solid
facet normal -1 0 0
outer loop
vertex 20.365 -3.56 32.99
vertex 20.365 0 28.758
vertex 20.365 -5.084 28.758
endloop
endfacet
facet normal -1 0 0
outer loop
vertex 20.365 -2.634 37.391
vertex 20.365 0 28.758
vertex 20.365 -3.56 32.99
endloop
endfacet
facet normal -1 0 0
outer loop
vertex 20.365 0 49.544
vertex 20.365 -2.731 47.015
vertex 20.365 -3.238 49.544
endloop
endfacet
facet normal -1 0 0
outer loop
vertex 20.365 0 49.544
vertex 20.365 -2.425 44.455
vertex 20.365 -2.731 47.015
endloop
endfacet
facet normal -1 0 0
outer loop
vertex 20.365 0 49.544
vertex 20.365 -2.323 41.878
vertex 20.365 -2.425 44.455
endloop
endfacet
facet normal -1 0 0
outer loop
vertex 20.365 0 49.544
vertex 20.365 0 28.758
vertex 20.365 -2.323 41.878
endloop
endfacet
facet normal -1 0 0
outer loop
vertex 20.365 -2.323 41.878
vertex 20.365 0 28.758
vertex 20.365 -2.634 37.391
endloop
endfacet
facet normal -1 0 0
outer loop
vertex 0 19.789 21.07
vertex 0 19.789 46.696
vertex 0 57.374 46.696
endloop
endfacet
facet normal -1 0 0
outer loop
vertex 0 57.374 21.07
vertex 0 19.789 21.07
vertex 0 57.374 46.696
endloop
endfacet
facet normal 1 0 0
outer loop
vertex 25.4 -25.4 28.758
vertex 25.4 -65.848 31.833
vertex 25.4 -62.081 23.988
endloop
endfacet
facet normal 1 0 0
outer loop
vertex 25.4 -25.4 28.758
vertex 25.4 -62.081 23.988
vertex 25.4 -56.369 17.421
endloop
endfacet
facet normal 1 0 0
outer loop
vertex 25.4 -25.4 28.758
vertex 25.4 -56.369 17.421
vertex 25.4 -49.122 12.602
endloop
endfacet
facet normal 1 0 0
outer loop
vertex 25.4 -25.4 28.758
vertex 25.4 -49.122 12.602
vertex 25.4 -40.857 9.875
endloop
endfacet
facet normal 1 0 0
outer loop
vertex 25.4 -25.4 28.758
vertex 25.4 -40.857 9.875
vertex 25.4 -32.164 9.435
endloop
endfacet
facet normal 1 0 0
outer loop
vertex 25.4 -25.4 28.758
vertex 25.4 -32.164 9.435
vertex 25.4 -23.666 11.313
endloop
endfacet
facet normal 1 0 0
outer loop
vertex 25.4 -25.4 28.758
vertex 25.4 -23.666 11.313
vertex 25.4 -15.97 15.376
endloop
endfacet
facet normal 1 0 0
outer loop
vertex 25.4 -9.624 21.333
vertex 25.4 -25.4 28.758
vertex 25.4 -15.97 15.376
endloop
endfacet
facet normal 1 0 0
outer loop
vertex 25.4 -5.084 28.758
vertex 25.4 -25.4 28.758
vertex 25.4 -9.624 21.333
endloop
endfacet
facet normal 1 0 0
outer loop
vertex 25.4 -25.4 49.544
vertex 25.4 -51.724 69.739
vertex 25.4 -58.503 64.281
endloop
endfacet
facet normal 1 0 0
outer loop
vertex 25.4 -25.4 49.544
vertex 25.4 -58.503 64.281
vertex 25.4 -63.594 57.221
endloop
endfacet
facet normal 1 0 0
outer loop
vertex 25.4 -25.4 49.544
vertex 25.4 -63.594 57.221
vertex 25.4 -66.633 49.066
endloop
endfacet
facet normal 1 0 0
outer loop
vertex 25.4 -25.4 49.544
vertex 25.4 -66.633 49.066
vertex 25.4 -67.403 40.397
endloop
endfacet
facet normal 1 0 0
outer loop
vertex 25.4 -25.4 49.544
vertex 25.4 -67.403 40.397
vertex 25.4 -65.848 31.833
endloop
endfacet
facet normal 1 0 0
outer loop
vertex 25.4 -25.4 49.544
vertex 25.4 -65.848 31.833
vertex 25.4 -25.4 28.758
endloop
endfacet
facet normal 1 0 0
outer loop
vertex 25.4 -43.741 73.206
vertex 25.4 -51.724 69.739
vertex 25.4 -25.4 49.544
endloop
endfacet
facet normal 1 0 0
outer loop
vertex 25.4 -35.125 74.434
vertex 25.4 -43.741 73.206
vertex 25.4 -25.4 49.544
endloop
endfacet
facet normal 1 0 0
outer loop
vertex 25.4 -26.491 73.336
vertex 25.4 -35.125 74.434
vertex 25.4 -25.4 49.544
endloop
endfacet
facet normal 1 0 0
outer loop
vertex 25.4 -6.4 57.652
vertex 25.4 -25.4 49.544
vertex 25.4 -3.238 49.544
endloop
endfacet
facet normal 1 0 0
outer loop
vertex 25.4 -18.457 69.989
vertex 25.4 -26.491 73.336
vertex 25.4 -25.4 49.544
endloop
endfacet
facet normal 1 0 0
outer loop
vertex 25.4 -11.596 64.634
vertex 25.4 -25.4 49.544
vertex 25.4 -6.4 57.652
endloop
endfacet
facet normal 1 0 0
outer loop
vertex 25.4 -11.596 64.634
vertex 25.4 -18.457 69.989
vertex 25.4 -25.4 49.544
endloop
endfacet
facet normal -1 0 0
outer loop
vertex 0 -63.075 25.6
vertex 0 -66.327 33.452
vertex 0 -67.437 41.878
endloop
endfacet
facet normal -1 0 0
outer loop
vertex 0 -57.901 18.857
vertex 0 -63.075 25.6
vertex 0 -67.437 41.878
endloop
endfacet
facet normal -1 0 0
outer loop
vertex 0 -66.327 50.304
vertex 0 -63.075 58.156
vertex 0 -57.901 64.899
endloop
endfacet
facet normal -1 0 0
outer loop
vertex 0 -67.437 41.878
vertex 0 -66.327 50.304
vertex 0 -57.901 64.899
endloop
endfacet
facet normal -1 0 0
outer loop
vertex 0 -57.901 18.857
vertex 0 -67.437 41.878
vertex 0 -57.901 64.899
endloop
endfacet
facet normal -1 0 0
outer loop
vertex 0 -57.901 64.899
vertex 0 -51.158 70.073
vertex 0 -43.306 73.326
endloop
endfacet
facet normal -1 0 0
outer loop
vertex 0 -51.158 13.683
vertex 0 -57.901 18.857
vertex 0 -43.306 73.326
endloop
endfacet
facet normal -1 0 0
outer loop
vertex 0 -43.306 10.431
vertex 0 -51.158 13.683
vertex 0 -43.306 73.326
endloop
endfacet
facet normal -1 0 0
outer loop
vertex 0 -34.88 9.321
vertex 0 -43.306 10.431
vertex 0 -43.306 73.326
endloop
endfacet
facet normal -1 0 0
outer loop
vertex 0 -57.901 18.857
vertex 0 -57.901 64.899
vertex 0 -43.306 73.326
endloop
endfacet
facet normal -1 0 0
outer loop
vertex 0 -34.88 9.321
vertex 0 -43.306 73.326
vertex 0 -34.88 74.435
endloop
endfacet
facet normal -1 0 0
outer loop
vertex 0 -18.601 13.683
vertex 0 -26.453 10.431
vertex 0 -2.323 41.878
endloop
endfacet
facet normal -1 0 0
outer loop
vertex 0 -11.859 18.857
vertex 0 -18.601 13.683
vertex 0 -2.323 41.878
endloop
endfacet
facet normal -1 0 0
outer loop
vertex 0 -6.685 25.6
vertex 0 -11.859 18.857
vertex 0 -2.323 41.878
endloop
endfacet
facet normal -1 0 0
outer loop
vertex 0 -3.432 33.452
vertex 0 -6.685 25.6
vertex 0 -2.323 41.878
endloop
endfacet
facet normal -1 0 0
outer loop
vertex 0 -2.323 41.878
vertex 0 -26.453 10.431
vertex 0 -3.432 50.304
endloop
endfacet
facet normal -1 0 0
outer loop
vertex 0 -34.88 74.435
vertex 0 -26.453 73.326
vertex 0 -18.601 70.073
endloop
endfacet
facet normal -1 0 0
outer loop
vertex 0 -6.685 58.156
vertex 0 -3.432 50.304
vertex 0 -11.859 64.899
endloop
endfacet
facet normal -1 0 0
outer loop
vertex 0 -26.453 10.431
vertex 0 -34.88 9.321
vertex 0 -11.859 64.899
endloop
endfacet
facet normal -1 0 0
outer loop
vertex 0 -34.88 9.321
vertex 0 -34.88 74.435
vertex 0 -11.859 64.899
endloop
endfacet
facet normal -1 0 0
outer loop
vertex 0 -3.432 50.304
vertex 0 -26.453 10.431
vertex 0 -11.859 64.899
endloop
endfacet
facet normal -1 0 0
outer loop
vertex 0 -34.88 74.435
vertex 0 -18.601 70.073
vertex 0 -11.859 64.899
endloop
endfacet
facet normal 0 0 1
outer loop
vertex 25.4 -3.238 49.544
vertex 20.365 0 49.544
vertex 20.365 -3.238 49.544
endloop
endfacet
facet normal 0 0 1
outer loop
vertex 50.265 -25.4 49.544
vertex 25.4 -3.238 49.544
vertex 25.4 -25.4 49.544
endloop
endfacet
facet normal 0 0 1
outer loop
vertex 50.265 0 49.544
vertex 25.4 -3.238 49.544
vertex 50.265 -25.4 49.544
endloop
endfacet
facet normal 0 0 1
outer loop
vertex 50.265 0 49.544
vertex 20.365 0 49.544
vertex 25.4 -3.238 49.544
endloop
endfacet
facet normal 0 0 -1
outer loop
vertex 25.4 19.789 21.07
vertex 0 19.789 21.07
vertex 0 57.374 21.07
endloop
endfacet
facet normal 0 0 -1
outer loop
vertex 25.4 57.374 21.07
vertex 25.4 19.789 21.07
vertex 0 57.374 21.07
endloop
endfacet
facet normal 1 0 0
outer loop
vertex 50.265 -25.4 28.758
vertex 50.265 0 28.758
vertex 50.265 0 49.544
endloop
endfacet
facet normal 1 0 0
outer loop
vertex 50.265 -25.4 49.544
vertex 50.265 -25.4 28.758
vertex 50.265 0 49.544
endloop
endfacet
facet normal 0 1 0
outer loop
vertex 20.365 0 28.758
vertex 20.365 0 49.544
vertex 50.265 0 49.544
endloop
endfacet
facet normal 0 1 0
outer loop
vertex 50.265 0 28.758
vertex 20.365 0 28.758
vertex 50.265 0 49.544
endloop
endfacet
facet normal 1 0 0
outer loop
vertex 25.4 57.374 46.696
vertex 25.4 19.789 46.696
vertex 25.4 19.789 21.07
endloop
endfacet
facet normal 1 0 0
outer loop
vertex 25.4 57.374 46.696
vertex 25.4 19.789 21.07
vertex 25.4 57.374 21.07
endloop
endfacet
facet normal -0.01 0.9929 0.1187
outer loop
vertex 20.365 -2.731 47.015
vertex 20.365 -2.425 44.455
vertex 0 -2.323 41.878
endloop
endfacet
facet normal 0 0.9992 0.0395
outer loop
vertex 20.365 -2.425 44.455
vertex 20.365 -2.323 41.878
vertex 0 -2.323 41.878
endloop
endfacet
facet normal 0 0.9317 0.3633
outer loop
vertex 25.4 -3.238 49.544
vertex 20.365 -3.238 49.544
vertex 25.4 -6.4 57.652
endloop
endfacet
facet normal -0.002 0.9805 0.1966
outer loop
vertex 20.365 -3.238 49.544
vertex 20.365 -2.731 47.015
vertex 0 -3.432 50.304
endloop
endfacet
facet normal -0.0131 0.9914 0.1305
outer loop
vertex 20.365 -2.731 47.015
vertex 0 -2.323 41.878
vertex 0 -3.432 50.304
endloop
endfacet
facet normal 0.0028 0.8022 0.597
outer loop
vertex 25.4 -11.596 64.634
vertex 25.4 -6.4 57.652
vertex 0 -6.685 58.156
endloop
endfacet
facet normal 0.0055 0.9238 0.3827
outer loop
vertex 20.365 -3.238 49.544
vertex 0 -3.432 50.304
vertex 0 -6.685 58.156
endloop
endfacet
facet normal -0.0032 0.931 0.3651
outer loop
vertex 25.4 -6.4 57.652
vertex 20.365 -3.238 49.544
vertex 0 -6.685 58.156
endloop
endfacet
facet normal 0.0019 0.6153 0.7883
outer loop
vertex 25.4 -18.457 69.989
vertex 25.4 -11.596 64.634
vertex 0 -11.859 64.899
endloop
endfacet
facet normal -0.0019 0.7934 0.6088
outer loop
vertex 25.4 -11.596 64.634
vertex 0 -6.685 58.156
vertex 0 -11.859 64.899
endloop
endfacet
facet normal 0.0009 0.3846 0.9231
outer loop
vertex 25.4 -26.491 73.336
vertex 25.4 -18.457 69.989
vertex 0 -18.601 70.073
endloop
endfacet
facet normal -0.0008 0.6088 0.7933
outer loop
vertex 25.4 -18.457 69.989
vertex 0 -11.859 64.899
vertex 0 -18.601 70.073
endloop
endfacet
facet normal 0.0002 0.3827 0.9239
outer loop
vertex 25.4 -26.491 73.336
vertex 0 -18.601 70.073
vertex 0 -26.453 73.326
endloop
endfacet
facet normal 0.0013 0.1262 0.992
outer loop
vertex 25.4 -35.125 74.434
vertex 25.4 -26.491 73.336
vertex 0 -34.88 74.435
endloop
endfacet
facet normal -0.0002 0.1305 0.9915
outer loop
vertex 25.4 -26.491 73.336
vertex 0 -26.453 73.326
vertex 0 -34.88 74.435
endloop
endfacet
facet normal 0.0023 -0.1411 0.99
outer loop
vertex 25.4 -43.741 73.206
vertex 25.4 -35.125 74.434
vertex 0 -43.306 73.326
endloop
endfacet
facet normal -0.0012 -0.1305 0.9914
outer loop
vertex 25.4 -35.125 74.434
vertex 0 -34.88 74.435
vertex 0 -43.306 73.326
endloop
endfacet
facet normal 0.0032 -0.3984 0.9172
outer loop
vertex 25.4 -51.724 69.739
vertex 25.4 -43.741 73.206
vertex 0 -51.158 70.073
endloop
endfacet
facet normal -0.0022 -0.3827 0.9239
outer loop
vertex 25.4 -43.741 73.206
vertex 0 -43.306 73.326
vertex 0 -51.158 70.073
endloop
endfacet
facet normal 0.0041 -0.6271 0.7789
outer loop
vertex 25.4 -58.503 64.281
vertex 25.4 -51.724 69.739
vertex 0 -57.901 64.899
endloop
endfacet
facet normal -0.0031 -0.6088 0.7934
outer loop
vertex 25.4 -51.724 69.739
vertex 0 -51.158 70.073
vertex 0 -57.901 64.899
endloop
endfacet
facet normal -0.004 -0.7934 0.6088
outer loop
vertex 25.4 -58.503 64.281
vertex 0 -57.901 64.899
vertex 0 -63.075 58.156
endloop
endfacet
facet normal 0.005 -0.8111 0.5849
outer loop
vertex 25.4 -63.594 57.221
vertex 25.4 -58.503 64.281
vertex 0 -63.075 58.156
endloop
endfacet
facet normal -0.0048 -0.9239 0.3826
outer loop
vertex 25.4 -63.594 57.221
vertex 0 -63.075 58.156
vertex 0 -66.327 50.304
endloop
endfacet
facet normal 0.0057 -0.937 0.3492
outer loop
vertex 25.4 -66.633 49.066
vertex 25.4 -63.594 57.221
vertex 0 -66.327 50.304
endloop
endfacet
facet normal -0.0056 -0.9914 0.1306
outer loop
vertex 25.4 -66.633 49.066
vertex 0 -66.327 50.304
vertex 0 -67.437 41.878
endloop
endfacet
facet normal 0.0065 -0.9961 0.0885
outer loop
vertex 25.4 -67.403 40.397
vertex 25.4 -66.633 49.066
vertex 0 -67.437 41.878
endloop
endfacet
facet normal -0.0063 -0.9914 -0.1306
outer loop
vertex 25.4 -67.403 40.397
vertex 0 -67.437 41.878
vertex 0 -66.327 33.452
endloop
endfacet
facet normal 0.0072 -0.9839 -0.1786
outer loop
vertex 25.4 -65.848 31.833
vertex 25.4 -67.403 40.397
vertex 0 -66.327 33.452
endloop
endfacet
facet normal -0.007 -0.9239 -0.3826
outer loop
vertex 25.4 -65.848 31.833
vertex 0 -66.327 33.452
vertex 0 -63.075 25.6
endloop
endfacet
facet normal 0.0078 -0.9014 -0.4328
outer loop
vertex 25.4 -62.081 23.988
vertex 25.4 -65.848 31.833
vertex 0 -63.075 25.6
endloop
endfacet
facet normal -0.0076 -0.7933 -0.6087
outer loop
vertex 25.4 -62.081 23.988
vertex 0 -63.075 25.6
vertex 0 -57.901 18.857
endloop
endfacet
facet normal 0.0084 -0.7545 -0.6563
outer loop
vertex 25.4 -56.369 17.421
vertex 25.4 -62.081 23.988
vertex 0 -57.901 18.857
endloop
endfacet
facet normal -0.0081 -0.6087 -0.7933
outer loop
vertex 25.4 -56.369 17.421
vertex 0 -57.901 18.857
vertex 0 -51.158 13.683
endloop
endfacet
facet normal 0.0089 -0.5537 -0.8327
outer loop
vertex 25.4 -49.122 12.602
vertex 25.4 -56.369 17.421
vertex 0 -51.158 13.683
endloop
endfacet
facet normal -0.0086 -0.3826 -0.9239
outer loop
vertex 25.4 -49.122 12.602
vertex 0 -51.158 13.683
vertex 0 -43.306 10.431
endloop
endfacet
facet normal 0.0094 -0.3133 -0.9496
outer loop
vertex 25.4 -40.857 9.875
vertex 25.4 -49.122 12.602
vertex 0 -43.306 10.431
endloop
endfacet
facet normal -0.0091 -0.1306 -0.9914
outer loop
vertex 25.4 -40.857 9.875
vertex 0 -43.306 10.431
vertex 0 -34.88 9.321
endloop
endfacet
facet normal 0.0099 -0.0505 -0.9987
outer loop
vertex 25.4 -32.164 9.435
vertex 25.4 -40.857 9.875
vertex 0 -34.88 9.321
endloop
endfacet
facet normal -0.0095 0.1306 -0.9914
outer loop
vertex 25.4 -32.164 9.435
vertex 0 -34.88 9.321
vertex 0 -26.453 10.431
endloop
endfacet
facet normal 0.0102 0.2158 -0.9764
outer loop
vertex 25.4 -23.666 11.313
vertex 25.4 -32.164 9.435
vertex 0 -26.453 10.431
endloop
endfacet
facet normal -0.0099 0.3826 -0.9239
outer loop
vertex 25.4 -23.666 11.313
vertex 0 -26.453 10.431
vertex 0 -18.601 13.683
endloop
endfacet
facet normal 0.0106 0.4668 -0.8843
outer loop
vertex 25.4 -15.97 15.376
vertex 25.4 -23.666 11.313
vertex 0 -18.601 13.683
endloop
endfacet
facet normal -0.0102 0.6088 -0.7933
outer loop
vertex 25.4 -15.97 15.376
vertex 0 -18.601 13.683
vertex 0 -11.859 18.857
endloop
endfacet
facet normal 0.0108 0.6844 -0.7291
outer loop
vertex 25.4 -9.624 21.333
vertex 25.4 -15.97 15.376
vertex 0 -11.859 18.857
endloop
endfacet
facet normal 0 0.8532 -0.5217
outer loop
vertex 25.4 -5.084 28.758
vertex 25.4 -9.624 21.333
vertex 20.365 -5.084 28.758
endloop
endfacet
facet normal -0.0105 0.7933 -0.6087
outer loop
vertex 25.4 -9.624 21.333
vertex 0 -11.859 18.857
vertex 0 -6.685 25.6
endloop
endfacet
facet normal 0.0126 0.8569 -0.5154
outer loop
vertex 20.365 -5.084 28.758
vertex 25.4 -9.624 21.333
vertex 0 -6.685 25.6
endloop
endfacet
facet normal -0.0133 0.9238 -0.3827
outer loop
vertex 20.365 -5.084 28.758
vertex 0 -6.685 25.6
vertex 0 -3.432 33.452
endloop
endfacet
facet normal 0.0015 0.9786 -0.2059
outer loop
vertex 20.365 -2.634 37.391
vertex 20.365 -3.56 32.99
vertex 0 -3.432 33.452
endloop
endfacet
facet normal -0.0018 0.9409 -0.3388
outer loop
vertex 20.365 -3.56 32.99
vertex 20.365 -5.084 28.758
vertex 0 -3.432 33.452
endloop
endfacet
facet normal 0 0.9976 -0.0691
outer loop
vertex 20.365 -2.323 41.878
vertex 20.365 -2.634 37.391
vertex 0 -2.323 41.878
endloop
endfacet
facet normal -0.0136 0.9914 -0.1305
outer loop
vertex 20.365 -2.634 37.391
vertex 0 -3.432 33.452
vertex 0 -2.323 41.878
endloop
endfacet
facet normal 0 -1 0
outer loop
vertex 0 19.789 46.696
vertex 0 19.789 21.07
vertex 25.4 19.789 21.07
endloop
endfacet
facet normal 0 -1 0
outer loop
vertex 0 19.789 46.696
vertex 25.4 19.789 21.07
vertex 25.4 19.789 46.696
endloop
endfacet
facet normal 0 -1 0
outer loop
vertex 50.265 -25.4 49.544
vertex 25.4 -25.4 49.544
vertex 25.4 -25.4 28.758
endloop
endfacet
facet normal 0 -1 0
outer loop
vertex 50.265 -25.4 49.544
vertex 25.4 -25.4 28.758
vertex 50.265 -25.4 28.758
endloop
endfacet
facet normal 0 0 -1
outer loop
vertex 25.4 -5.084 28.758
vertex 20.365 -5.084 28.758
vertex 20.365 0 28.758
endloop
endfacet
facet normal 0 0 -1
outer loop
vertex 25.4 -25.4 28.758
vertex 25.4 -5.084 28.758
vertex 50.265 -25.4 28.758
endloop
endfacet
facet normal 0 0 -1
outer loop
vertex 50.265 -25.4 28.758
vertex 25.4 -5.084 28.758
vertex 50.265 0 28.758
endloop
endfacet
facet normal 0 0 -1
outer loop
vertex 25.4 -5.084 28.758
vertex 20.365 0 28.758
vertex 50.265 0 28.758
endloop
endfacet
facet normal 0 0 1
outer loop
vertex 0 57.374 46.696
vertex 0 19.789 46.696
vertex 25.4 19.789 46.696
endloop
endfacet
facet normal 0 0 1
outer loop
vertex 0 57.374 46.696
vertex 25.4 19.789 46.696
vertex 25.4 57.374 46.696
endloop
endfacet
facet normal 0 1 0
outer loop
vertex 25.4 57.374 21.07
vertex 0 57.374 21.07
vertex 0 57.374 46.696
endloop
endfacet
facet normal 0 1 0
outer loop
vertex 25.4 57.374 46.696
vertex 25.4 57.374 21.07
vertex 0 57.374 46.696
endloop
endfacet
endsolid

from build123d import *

# Parameters (mm, degrees)
F0_W     = 29.900016
F0_H     = 20.785517
F1_DEPTH = 25.4
F2_W     = 37.584766
F2_H     = 25.625983
F3_DEPTH = 25.4
F4_R     = 32.556838
F5_DEPTH = 25.4


with BuildPart() as f1:
    # F0 (on Front) → F1 (new body)
    with BuildSketch(Plane.XZ):
        with Locations((35.314548, 39.150802)):
            Rectangle(F0_W, F0_H)
    extrude(amount=F1_DEPTH)

    # F4 (on Right) → F5 (join)
    with BuildSketch(Plane.YZ):
        with Locations((-34.879804, 41.87803)):
            Circle(F4_R)
    extrude(amount=F5_DEPTH)


with BuildPart() as f3:
    # F2 (on Right) → F3 (new body)
    with BuildSketch(Plane.YZ):
        with Locations((38.581334, 33.88324)):
            Rectangle(F2_W, F2_H)
    extrude(amount=F3_DEPTH)


solid = Compound([f1.part, f3.part])
